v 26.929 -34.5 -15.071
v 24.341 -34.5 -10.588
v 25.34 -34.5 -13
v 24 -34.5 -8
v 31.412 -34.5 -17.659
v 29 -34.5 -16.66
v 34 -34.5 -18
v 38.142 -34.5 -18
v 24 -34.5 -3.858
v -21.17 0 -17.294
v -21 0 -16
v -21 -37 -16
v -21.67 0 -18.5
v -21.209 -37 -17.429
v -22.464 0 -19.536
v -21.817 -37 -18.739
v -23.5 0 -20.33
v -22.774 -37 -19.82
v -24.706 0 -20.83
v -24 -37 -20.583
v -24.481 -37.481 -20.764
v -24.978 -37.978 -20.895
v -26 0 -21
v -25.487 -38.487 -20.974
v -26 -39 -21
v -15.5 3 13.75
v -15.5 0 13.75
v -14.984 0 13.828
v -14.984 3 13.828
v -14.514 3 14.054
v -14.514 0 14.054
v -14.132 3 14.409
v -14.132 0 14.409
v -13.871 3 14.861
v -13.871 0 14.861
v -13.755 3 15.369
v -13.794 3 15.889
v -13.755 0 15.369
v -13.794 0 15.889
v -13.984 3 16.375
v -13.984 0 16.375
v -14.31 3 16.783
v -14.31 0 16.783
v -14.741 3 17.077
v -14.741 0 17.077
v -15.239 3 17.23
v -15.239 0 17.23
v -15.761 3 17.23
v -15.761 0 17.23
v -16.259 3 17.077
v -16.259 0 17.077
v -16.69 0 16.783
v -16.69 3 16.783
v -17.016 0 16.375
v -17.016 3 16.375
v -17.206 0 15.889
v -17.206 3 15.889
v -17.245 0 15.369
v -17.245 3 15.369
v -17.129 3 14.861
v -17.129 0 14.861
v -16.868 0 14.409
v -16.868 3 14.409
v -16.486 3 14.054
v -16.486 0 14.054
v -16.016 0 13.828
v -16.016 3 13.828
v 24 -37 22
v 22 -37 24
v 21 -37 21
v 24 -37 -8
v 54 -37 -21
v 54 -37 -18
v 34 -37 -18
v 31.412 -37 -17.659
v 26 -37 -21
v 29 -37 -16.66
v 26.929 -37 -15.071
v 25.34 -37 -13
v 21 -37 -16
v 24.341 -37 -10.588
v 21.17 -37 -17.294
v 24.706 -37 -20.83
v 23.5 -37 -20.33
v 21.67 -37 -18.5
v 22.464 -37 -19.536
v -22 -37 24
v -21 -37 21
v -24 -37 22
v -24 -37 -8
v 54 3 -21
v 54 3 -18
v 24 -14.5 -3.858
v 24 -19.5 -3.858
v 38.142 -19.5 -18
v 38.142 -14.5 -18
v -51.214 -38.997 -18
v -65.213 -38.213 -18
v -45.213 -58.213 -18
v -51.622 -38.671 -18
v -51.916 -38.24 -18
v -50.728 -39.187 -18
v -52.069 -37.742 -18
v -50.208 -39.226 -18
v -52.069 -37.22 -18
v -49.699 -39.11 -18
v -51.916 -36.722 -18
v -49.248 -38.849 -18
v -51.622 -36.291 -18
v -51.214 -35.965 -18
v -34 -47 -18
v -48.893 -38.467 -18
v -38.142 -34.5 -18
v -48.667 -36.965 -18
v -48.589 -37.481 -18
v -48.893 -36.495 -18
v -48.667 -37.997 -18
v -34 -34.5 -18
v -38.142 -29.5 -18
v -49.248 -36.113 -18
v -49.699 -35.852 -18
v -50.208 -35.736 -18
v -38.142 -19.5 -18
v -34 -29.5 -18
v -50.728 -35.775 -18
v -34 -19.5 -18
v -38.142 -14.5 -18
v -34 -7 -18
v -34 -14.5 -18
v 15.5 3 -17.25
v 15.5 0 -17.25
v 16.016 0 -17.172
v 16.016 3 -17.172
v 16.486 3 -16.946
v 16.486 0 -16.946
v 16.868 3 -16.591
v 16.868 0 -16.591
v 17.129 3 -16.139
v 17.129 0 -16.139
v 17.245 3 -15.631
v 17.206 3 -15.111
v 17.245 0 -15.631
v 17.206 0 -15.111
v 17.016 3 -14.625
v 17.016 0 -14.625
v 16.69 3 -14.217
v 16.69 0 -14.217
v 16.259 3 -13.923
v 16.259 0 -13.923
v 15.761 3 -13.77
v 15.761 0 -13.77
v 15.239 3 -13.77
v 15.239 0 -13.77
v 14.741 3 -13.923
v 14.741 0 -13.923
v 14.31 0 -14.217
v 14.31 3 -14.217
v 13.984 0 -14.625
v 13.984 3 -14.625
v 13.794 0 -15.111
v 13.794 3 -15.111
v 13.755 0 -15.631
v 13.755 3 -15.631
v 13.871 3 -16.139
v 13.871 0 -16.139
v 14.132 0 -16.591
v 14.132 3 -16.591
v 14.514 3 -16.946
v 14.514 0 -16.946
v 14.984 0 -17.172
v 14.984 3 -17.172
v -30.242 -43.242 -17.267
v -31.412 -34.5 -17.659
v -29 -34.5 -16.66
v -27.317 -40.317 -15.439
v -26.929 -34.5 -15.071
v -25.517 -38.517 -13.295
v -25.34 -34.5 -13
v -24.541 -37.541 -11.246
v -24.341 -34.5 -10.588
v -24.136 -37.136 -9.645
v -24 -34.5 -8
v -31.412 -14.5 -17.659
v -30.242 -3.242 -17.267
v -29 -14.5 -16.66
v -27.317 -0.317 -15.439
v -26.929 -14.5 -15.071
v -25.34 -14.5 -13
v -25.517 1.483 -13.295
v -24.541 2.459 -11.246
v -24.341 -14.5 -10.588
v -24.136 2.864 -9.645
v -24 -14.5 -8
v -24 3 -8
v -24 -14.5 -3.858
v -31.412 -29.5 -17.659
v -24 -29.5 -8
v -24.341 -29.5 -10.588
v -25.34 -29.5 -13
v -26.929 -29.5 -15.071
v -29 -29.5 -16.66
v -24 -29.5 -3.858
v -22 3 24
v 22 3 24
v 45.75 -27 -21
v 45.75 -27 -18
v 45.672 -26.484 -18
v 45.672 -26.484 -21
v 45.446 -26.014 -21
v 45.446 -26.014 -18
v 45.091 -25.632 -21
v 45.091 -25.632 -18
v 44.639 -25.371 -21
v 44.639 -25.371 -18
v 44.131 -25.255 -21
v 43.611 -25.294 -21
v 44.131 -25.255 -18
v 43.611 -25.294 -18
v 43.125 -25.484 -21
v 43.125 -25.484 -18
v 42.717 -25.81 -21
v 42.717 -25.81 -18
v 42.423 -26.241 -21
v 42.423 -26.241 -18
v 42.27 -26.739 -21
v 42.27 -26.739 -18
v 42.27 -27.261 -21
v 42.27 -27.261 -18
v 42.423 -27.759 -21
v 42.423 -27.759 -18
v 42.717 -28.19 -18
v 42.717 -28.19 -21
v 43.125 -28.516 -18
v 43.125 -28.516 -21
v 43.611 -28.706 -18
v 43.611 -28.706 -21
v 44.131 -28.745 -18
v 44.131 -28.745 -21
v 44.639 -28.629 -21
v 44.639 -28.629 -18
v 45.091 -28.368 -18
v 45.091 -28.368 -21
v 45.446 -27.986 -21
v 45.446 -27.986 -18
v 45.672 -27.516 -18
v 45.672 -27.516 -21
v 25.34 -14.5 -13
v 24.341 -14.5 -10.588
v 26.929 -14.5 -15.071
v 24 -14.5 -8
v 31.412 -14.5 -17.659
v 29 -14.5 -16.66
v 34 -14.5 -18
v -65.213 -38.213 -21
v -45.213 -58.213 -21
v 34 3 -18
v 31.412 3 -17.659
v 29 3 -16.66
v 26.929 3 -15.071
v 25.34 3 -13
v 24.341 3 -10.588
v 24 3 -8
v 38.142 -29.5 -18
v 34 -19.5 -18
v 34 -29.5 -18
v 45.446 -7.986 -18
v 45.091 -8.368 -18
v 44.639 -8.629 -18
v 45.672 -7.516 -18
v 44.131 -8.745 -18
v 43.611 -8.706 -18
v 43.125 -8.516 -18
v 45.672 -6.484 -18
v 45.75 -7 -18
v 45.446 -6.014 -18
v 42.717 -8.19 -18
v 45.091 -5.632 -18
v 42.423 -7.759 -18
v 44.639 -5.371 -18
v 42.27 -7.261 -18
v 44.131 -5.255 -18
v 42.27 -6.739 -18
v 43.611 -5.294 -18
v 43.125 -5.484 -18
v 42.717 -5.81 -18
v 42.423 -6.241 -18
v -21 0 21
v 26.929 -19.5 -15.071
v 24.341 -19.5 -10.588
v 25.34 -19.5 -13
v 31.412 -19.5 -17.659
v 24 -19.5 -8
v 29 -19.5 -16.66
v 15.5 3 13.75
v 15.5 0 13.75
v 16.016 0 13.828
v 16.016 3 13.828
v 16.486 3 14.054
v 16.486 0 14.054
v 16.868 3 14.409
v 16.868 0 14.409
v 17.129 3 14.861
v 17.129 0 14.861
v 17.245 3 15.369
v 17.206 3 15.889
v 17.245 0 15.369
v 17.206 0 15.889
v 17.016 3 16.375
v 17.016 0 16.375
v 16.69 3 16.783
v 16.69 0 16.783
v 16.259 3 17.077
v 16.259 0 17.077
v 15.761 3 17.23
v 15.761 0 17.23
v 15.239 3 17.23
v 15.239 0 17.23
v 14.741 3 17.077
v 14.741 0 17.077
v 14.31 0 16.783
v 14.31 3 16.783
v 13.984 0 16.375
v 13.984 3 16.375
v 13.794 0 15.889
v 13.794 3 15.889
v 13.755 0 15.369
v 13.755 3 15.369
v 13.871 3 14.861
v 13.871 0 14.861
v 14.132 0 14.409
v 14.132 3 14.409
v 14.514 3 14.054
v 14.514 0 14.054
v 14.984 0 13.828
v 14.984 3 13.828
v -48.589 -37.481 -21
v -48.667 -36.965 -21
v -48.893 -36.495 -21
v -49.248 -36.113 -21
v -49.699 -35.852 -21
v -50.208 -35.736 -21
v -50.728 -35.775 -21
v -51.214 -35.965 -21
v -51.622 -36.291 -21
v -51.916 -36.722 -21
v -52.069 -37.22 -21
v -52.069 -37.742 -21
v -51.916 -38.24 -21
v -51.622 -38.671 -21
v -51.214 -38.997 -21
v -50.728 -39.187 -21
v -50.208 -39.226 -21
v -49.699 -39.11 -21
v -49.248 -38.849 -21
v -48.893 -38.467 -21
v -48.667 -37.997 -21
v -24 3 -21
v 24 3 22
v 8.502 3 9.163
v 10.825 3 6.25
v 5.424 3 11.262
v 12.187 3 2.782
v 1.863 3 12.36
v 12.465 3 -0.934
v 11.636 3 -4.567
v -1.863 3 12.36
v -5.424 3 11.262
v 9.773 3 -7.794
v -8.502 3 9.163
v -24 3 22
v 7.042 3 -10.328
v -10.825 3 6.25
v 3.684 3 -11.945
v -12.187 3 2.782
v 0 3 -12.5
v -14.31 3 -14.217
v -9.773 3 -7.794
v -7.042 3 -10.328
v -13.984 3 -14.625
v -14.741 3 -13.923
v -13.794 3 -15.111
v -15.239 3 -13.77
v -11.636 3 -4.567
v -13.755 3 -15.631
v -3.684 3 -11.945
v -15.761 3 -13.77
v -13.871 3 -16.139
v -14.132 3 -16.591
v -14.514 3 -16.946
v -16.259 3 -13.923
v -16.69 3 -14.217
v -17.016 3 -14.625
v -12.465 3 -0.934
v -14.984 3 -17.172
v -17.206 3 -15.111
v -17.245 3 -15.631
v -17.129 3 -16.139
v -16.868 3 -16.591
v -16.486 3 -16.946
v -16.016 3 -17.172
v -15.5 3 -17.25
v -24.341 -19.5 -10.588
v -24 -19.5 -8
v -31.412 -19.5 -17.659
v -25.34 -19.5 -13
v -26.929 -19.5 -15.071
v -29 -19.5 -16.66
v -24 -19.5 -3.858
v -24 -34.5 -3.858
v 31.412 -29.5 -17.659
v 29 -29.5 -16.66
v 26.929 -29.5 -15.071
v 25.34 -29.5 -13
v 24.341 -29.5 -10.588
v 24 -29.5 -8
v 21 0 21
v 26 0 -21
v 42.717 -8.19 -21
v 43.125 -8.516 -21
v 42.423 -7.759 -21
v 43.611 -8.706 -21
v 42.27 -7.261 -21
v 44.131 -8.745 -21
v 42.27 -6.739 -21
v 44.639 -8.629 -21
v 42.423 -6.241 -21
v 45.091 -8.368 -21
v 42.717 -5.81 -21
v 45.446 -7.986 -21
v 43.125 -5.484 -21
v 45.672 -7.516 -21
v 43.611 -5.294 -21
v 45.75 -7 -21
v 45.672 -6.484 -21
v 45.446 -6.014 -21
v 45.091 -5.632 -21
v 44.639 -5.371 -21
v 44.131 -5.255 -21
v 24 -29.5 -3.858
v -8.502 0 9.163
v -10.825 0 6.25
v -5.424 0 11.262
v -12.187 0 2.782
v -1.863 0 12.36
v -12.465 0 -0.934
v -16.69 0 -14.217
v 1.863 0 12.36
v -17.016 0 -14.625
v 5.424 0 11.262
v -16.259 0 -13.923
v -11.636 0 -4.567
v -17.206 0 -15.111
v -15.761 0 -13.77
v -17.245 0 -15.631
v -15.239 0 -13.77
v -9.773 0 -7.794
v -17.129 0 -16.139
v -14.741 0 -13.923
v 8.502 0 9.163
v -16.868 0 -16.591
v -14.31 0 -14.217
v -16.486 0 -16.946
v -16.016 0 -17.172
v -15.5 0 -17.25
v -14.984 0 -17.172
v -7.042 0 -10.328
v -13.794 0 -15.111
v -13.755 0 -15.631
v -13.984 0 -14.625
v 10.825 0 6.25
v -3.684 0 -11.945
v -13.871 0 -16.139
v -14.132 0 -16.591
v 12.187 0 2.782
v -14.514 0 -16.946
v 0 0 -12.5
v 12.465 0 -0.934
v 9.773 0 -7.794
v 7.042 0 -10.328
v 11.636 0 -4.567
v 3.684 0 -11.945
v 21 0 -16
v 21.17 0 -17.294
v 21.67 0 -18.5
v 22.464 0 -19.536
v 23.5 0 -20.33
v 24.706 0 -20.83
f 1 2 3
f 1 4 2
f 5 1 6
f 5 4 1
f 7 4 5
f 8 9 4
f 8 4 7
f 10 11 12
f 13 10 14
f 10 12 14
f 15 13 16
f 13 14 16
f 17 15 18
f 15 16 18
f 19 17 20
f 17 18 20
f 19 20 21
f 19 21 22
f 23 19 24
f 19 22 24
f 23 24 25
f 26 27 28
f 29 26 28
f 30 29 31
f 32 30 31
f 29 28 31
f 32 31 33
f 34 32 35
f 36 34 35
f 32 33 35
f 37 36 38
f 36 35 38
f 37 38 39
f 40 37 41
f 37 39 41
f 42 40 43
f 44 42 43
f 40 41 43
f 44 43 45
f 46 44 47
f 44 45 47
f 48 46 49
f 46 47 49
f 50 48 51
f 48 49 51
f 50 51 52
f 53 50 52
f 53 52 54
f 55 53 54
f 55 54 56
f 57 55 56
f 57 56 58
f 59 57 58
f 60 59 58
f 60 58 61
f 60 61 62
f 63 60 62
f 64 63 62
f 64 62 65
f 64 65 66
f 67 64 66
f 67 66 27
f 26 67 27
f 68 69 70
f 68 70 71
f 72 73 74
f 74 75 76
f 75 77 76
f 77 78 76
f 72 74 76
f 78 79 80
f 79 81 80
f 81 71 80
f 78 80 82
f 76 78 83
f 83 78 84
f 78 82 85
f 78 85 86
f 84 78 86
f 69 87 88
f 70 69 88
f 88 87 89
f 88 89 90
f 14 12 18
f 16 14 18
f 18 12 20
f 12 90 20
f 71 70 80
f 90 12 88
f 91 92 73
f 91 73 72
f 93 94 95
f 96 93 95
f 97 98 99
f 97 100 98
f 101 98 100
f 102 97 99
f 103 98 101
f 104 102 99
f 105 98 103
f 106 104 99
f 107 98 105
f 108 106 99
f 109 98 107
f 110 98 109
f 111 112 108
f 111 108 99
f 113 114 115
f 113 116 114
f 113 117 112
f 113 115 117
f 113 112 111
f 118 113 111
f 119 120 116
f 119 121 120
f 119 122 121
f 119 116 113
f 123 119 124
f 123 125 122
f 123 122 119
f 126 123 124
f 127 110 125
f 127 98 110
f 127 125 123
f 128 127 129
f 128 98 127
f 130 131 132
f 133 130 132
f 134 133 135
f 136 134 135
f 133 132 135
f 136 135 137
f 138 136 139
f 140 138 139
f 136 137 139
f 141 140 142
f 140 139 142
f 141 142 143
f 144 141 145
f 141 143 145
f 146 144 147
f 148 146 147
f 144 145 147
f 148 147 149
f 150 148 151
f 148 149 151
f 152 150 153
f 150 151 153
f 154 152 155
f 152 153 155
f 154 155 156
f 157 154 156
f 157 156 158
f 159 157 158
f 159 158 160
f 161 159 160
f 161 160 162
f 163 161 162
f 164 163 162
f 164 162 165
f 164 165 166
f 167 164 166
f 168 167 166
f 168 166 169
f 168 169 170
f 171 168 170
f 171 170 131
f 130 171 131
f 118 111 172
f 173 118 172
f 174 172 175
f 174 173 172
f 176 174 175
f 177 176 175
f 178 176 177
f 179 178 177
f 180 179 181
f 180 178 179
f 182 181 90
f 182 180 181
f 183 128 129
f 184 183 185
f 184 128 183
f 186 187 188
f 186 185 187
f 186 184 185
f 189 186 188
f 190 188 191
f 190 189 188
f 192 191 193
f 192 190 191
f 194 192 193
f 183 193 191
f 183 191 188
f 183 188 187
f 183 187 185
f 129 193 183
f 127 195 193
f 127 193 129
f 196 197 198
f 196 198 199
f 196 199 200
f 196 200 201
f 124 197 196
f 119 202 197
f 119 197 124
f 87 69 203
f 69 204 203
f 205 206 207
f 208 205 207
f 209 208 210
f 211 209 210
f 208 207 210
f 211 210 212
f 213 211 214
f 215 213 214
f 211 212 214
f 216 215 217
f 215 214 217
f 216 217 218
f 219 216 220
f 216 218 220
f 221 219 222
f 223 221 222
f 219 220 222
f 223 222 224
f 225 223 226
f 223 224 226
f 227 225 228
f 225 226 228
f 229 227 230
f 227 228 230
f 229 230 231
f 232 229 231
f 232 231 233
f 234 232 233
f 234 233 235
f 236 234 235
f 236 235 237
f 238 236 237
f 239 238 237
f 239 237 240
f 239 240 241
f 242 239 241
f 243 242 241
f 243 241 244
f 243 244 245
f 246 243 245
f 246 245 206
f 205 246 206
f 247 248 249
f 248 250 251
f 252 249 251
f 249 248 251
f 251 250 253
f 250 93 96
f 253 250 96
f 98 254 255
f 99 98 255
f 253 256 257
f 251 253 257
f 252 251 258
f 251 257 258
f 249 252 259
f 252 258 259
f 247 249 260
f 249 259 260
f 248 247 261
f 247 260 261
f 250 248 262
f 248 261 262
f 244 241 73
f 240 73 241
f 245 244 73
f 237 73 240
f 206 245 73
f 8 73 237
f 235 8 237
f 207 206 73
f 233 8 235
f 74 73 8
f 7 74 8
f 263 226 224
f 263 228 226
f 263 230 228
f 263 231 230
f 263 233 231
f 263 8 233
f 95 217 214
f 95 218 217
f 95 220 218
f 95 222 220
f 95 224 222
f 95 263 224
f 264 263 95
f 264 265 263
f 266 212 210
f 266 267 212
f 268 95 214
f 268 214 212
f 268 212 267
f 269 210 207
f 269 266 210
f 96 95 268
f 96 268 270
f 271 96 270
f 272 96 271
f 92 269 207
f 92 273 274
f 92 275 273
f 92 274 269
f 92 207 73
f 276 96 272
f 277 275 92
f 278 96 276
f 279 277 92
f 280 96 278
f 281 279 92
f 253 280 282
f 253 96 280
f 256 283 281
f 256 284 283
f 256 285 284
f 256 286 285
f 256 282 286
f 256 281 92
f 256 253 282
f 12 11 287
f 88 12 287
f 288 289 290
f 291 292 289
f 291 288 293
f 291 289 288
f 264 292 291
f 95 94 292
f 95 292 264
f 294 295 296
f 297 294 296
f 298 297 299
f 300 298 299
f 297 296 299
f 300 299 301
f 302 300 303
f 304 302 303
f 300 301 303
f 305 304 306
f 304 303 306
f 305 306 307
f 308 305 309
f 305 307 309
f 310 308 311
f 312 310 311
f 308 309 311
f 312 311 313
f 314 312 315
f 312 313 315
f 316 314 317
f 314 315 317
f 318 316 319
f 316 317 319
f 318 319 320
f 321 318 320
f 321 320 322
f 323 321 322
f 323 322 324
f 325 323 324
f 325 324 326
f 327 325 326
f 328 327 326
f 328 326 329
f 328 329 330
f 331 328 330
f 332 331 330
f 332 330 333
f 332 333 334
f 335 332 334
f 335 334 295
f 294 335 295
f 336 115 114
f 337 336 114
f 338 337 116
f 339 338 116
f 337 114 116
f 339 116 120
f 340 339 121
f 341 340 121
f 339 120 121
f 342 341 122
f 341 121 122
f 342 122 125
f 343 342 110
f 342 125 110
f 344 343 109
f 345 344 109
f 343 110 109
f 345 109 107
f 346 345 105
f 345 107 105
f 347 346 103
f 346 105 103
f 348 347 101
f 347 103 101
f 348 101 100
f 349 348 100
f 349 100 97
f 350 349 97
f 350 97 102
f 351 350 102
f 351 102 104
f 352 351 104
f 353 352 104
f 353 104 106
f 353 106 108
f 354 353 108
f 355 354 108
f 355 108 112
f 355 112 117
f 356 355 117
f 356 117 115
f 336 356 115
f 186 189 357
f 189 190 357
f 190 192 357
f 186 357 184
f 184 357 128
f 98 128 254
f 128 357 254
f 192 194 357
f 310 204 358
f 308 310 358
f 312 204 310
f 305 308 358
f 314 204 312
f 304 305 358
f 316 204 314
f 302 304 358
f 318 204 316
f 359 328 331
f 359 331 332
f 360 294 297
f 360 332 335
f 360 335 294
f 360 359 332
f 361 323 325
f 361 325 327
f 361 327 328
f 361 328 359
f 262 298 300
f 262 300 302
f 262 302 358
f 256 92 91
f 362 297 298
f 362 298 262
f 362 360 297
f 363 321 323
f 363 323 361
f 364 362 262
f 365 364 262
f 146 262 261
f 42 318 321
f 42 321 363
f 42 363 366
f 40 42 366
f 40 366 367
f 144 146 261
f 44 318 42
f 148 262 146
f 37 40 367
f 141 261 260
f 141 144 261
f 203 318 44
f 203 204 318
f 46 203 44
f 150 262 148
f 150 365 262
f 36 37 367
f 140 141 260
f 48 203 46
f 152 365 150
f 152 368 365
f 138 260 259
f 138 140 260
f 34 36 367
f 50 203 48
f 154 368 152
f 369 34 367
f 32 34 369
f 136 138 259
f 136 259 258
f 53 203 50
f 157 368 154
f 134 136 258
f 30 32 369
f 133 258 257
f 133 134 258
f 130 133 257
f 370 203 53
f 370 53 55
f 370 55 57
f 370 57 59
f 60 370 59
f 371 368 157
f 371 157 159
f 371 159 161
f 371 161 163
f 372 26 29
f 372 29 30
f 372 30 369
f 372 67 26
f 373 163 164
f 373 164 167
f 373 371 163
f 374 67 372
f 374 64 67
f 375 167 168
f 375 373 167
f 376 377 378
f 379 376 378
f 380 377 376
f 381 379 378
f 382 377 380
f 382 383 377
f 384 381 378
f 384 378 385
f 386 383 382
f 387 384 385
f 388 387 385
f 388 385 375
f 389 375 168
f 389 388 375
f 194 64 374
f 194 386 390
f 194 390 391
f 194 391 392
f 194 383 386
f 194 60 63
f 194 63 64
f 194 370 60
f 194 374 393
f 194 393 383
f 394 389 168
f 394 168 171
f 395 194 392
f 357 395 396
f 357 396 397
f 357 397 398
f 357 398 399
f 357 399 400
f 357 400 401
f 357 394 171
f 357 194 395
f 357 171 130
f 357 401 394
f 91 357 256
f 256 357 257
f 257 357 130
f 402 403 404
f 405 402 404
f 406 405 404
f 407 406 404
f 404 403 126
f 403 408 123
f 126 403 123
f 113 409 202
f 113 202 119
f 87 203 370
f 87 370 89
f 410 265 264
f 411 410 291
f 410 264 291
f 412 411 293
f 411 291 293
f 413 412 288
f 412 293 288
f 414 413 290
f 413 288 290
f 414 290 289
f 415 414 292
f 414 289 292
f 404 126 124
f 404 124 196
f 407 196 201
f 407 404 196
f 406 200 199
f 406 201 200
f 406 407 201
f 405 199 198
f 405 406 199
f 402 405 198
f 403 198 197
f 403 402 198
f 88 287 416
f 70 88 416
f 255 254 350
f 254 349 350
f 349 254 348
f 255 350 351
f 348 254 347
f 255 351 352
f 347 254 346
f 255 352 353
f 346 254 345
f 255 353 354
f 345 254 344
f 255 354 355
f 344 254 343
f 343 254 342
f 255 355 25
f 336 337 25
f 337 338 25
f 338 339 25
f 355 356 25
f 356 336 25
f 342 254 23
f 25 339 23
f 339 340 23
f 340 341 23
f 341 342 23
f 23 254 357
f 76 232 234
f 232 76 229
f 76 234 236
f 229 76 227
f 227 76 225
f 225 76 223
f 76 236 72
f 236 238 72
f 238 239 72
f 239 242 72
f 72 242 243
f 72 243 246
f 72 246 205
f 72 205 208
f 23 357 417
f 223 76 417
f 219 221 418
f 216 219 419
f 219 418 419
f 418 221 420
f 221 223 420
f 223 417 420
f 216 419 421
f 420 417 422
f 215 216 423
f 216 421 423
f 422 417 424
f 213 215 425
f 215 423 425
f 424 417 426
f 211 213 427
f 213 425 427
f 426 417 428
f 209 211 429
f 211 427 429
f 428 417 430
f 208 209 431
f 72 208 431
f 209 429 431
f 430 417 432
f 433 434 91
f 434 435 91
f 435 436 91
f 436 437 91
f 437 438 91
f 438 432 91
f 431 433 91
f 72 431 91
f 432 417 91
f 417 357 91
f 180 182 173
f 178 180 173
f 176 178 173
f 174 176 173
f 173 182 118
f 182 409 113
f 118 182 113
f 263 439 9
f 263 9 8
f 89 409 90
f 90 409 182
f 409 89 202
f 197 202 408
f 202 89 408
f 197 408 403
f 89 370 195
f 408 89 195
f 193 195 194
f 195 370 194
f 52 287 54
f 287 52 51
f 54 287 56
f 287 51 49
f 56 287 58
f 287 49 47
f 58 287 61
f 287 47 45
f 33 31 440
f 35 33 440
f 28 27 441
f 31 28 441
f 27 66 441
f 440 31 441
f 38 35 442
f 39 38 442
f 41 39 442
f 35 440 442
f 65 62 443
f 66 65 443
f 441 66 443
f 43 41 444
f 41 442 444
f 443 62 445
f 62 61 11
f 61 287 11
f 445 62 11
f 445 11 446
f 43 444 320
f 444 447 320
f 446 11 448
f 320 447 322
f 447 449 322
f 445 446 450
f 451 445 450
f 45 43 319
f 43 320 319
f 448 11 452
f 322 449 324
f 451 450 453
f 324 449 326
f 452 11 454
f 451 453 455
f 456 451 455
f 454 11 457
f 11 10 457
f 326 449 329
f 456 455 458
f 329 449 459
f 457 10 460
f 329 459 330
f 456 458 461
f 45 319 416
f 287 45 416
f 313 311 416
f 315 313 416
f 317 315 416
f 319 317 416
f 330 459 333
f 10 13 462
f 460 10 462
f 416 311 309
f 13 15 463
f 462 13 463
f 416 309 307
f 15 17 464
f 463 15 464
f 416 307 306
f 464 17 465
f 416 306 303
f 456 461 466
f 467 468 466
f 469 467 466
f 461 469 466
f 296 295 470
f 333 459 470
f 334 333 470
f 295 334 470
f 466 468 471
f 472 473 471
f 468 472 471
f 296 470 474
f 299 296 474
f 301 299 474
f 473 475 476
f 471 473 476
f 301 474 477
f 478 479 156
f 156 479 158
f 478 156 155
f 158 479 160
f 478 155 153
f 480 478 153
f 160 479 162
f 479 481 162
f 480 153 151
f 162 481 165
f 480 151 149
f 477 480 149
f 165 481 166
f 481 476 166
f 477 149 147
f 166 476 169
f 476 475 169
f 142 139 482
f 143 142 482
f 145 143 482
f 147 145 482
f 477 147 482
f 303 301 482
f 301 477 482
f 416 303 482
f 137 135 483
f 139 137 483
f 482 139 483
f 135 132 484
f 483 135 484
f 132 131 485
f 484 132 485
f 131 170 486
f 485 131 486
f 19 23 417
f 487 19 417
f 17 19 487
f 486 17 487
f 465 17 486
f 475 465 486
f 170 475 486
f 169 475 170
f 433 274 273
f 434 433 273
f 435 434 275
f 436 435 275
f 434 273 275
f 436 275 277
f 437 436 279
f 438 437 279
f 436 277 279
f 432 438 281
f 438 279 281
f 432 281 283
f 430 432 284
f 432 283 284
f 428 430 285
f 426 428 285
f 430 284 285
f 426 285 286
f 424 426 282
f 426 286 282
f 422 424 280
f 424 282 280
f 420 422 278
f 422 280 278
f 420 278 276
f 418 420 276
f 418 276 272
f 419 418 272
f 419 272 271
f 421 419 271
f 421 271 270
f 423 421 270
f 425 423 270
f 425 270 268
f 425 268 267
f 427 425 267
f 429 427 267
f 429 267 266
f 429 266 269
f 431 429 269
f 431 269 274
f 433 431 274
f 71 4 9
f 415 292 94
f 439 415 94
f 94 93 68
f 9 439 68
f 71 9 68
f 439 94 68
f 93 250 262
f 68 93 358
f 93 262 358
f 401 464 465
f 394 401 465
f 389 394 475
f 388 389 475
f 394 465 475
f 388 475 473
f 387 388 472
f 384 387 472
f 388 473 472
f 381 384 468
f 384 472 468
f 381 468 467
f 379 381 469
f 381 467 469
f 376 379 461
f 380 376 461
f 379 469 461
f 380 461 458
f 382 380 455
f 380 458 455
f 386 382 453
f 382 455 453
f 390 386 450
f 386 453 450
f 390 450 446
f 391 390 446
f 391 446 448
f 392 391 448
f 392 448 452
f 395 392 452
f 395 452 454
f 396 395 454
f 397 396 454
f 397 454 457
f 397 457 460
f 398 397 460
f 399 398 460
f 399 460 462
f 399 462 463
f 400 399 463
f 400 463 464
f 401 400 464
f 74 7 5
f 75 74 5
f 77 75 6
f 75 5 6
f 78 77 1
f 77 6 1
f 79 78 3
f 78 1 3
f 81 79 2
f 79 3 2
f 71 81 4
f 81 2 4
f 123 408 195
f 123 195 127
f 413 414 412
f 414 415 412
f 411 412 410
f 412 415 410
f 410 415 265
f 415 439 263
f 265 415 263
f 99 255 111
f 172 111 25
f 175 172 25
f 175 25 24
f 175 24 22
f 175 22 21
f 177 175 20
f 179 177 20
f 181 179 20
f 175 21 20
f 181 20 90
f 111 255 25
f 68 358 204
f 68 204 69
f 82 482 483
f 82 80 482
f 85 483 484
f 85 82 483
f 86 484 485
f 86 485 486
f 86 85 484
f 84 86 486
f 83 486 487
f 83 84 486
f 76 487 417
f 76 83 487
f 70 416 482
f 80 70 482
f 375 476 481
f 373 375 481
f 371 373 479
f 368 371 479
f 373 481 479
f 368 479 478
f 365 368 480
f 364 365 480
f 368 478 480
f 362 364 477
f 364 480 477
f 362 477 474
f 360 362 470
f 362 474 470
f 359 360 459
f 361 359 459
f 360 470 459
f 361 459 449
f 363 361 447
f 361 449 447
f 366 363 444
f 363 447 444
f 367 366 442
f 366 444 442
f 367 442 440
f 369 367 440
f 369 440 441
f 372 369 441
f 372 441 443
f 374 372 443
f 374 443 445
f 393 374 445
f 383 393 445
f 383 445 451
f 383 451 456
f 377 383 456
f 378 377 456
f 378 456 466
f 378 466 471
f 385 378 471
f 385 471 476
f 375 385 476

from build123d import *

# Parameters (mm, degrees)
SKETCH1_W               = 48
SKETCH1_H               = 45
BOSS_EXTRUDE1_DEPTH     = 3
BOSS_EXTRUDE2_DEPTH     = 37
SKETCH3_W               = 3
SKETCH3_H               = 40
BOSS_EXTRUDE3_DEPTH     = 30
BOSS_EXTRUDE4_DEPTH     = 3
FILLET1_R               = 10
FILLET2_R               = 5
CHAMFER1_SIZE           = 2
SKETCH5_R               = 1.75
SKETCH5_R_2             = 12.5
CUT_EXTRUDE1_DEPTH      = 91.65064234
RIB2_REACH              = 82.792
SKETCH6_WALL_W          = 183.583291708
SKETCH6_WALL_H          = 5
LPATTERN2_COUNT         = 2
LPATTERN2_PITCH         = 15
MIRROR1_COPY_1_REACH    = 82.792
MIRROR1_COPY_1_SKETCH_W = 183.583291708
MIRROR1_COPY_1_SKETCH_H = 5
SKETCH7_R               = 1.75
CUT_EXTRUDE2_DEPTH      = 97.982157929


with BuildPart() as part:
    # Sketch1 → Boss-Extrude1 (new body)
    with BuildSketch(Plane(origin=(0, 0, 0), x_dir=(1, 0, 0), z_dir=(0, 1, 0))):
        with Locations((0, -1.5)):
            Rectangle(SKETCH1_W, SKETCH1_H)
    extrude(amount=BOSS_EXTRUDE1_DEPTH)

    # Sketch2 → Boss-Extrude2 (add)
    with BuildSketch(Plane.XZ):
        Polygon((-21, 21), (21, 21), (21, -21), (24, -21), (24, 24), (-24, 24), (-24, -21), (-21, -21), align=None)
    extrude(amount=BOSS_EXTRUDE2_DEPTH)

    # Sketch3 → Boss-Extrude3 (add)
    with BuildSketch(Plane(origin=(24, 0, 0), x_dir=(0, 0, -1), z_dir=(1, 0, 0))):
        with Locations((19.5, -17)):
            Rectangle(SKETCH3_W, SKETCH3_H)
    extrude(amount=BOSS_EXTRUDE3_DEPTH)

    # Sketch4 → Boss-Extrude4 (add)
    with BuildSketch(Plane(origin=(0, 0, -21), x_dir=(-1, 0, 0), z_dir=(0, 0, -1))):
        Polygon((24, 3), (65.213203436, -38.213203436), (45.213203436, -58.213203436), (24, -37), align=None)
    extrude(amount=-BOSS_EXTRUDE4_DEPTH)

    # Fillet1
    fillet1_edges = [part.edges().sort_by_distance(p)[0] for p in [
        (24, -17, -18),
        (-24, -17, -18),
    ]]
    fillet(fillet1_edges, radius=FILLET1_R)

    # Fillet2
    fillet2_edges = [part.edges().sort_by_distance(p)[0] for p in [
        (21, -18.5, -21),
        (-21, -18.5, -21),
    ]]
    fillet(fillet2_edges, radius=FILLET2_R)

    # Chamfer1
    chamfer1_edges = [part.edges().sort_by_distance(p)[0] for p in [
        (24, -17, 24),
        (-24, -17, 24),
    ]]
    chamfer(chamfer1_edges, length=CHAMFER1_SIZE)

    # Sketch5 → Cut-Extrude1 (cut, through all)
    with BuildSketch(Plane.XZ):
        with Locations(Location((-15.5, 15.5, 0), (0, 0, 270))):
            Circle(SKETCH5_R)
        with Locations(Location((15.5, 15.5, 0), (0, 0, 270))):
            Circle(SKETCH5_R)
        with Locations(Location((15.5, -15.5, 0), (0, 0, 270))):
            Circle(SKETCH5_R)
        with Locations(Location((-15.5, -15.5, 0), (0, 0, 270))):
            Circle(SKETCH5_R)
        with Locations(Location((0, 0, 0), (0, 0, 270))):
            Circle(SKETCH5_R_2)
    extrude(amount=-CUT_EXTRUDE1_DEPTH, mode=Mode.SUBTRACT)

    # Sketch6 wall → Rib2 (add, up to next)
    with BuildSketch(Plane(origin=(-31.071067812, -17, -10.928932188), x_dir=(-0.707106781187, 0, -0.707106781187), z_dir=(-0.707106781187, 0, 0.707106781187)), mode=Mode.PRIVATE) as rib2_sk1:
        Rectangle(SKETCH6_WALL_W, SKETCH6_WALL_H)
    rib2_tool1 = extrude(rib2_sk1.sketch, amount=-RIB2_REACH, mode=Mode.PRIVATE) - part.part
    rib2 = rib2_tool1.solids().sort_by_distance((-31.071067812, -17, -10.928932188))[0]
    add(rib2)

    # LPattern2: Rib2 ×2
    with Locations(*[(0, -i * LPATTERN2_PITCH, 0) for i in range(1, LPATTERN2_COUNT)]):
        add(rib2)

    # Mirror1: Rib2 across plane
    add(rib2.mirror(Plane(origin=(0, 0, 0), x_dir=(0, 0, 1), z_dir=(1, 0, 0))))

    # Mirror1 copy 1 sketch → Mirror1 copy 1 (add, up to next)
    with BuildSketch(Plane(origin=(31.071067812, -32, -10.928932188), x_dir=(0.707106781187, 0, -0.707106781187), z_dir=(0.707106781187, 0, 0.707106781187)), mode=Mode.PRIVATE) as mirror1_copy_1_sk1:
        Rectangle(MIRROR1_COPY_1_SKETCH_W, MIRROR1_COPY_1_SKETCH_H)
    mirror1_copy_1_tool1 = extrude(mirror1_copy_1_sk1.sketch, amount=-MIRROR1_COPY_1_REACH, mode=Mode.PRIVATE) - part.part
    add(mirror1_copy_1_tool1.solids().sort_by_distance((31.071067812, -32, -10.928932188))[0])

    # Sketch7 → Cut-Extrude2 (cut, through all)
    with BuildSketch(Plane.XY.offset(-18)):
        with Locations((44, -7)):
            Circle(SKETCH7_R)
        with Locations((44, -27)):
            Circle(SKETCH7_R)
        with Locations((-50.338834765, -37.480970389)):
            Circle(SKETCH7_R)
    extrude(amount=-CUT_EXTRUDE2_DEPTH, mode=Mode.SUBTRACT)


solid = part.part
